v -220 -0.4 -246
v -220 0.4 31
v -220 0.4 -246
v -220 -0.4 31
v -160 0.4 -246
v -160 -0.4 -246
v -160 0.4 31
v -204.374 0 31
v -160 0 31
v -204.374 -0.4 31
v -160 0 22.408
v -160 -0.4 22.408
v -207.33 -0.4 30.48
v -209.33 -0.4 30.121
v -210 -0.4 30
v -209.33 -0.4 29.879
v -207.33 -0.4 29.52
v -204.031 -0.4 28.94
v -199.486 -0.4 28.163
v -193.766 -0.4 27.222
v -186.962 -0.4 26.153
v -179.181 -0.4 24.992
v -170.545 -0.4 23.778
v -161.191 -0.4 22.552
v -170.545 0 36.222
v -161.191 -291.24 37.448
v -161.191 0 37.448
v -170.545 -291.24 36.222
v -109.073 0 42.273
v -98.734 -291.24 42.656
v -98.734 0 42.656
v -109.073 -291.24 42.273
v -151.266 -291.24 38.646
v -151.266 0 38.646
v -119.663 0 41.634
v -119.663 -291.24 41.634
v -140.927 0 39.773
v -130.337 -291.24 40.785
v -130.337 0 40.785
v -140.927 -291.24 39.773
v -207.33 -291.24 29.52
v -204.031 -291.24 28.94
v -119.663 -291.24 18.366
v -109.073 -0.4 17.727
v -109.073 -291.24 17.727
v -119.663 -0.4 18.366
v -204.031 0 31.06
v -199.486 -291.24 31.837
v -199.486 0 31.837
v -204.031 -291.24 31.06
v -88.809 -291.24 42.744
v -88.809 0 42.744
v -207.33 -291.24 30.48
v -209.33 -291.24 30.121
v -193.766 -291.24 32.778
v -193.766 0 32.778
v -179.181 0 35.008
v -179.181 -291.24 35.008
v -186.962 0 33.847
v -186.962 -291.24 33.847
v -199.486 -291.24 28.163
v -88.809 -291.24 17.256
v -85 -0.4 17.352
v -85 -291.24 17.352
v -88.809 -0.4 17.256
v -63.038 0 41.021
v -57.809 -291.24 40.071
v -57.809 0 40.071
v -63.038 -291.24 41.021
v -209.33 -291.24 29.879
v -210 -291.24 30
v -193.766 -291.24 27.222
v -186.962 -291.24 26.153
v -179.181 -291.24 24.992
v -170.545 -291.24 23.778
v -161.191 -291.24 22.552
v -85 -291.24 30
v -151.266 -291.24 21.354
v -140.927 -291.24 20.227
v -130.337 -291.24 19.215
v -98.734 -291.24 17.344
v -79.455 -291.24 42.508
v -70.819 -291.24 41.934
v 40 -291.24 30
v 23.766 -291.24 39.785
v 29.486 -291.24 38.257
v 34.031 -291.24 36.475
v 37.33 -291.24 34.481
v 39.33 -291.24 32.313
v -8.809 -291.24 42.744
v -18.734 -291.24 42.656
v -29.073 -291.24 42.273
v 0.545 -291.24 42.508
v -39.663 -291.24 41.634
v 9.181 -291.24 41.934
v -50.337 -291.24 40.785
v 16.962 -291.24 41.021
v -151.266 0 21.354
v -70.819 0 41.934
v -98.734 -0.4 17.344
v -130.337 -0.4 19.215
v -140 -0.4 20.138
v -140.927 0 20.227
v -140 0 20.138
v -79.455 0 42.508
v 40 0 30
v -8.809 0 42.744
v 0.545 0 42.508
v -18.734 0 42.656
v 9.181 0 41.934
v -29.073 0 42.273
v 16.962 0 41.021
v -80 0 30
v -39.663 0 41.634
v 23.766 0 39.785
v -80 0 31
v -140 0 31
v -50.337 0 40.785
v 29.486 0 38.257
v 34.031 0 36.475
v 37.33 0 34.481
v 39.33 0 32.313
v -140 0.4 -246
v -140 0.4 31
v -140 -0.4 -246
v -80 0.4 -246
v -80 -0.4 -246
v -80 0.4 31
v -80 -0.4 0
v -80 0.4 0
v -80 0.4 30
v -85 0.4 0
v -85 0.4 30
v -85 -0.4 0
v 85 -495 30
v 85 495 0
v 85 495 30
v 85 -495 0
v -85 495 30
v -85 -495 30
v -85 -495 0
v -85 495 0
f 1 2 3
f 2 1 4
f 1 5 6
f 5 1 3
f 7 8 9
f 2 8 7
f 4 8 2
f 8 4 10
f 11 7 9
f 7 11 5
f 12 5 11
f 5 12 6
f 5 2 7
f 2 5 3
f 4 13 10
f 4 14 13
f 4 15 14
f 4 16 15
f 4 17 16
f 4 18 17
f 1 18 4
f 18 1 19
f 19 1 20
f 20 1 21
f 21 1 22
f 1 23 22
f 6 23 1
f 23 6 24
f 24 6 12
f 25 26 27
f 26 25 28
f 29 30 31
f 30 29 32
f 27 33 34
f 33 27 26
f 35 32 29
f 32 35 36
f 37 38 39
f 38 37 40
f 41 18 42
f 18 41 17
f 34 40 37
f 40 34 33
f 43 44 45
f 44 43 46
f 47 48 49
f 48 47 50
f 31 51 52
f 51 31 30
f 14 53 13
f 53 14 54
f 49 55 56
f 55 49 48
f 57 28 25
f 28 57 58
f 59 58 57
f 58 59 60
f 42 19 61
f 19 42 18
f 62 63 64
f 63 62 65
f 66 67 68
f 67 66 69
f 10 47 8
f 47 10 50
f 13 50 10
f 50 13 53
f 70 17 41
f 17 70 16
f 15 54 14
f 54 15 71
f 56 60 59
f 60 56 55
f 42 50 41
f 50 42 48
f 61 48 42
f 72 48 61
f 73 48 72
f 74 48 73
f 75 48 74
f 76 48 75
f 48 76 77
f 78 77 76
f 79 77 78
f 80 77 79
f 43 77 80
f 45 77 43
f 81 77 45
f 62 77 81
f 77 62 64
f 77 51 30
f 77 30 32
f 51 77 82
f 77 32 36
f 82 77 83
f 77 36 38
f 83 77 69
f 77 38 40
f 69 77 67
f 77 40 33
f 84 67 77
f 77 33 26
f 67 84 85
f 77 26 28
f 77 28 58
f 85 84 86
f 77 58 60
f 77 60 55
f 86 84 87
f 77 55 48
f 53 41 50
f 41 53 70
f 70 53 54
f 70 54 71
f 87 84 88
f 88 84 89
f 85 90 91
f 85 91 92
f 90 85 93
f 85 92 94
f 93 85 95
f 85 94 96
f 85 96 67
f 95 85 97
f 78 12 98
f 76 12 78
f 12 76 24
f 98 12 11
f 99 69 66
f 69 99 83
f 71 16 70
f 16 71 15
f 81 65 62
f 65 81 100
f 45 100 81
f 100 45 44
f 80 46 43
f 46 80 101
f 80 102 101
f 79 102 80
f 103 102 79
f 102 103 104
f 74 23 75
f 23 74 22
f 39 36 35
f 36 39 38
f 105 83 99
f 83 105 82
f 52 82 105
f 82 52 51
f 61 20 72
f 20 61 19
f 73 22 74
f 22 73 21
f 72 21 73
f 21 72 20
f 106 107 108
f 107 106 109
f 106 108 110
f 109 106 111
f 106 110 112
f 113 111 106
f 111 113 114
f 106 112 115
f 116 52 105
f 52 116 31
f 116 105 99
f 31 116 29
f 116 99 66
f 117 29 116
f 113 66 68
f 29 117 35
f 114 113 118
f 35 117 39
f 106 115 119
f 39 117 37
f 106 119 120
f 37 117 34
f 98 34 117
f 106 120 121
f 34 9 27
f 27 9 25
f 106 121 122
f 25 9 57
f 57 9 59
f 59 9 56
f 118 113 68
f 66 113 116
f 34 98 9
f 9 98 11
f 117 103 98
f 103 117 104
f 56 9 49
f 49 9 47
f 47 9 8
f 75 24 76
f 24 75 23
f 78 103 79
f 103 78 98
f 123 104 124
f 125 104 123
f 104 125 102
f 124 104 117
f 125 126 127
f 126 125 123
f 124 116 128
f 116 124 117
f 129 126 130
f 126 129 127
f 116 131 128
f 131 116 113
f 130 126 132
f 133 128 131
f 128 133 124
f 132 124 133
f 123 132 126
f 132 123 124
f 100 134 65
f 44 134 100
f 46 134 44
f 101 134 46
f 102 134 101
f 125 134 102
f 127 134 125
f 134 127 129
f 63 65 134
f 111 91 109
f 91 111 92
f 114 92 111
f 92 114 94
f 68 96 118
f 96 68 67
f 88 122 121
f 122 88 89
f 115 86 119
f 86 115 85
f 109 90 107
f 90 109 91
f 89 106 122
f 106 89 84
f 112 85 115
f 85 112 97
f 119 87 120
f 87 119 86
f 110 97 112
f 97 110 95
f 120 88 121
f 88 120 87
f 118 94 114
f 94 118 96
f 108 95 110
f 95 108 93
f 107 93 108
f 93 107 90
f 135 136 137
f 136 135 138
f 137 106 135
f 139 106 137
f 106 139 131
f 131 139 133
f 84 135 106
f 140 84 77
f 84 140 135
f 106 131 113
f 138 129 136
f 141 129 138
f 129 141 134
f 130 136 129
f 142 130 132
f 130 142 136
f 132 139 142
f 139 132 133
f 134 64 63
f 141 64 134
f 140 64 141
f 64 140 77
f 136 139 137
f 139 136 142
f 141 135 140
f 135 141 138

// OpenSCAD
// file: ../666_1032.scad
draft = true;   // sets rendering quality to draft.
$fs = draft ? 5 : 0.5;
$fa = 10;

module 666_1032(draft){

    airfoil_thickness = 0030;
    depth = main_tube_outer_diameter*2;
    width = main_tube_outer_diameter + 2*(main_tube_outer_diameter/10);
    height = depth;

    beta = 90 - trailing_edge_angle(naca = airfoil_thickness); // calculate the angle of trailing edge
    trailing_wall= 1/(cos(beta)); //calculate lenght of wall cut relative to wall thickness
    echo(trailing_wall); // print a relative thickness of material at traling edge to wall thickness. 

    difference (){
union(){

    difference(){
    	airfoil(naca = airfoil_thickness, L = 170, N=101, h = height_of_vertical_tube + main_tube_outer_diameter/2 + 2*global_clearance + coupling_wall_thickness, open = false);
    	translate ([hull_wall_thickness,0,45])
            resize([170 - hull_wall_thickness - trailing_wall*hull_wall_thickness,(170*airfoil_thickness/100)- 2*hull_wall_thickness,210], auto=true) 
                airfoil(naca = airfoil_thickness, L = 170, N=101, h = height_of_vertical_tube + main_tube_outer_diameter/2 + 2*global_clearance, open = false);
    }
    //lem spodní a horní díl
    intersection(){
        difference(){
            union(){
                translate([0,-75,cover_pilon_division[1] - hull_wall_thickness])
                        cube([190,150,hull_wall_thickness]);
                translate([0,-75,cover_pilon_division[1]])
                        cube([190,150,hull_wall_thickness]);
        }

        translate ([ribbon_width,0,45])
            resize([170 - ribbon_width - trailing_wall*ribbon_width,(170*airfoil_thickness/100)- 2*ribbon_width,210], auto=true) 
                airfoil(naca = airfoil_thickness, L = 170, N=101, h = height_of_vertical_tube + main_tube_outer_diameter/2 + 2*global_clearance, open = false);
    //difference
    }
        airfoil(naca = airfoil_thickness, L = 170, N=101, h = height_of_vertical_tube + main_tube_outer_diameter/2 + 2*global_clearance + coupling_wall_thickness, open = false);
}
}
    	//pro otevření
    	translate ([120,- hull_wall_thickness/2,- 2*global_clearance])
    	   cube ([60,hull_wall_thickness,height_of_vertical_tube + 4*global_clearance]);

    	translate ([main_tube_outer_diameter + coupling_wall_thickness*2,-depth/2 - global_clearance,height_of_vertical_tube - main_tube_outer_diameter*2 - global_clearance/2 + main_tube_outer_diameter/2 + coupling_wall_thickness])
    	   cube ([width*5,depth + 2*global_clearance,height+global_clearance + main_tube_outer_diameter]);

        // hull shell from 666_1025.scad
        translate ([- cover_pilon_position,0,0])
            rotate ([90,0,0])
                drop(draft);
    //final difference
    }
//final module
}


//pro tisk

module 666_1032_A(draft){
        intersection(){
                666_1032(draft);
            translate([0,- 75,0])
                cube([180,150,cover_pilon_division[1]]);
        }
}

module 666_1032_B(draft){
    translate([0,0,20])
        intersection(){
                666_1032(draft);
            translate([0,- 75,cover_pilon_division[1]])
                cube([180,150,cover_pilon_division[2] - cover_pilon_division[1]]);
        }
}

//666_1032(draft);
666_1032_A(draft);
666_1032_B(draft);

use <./lib/naca4.scad>
include <../Parameters.scad>
use <666_1025.scad>
use <888_1000.scad>
// file: ../888_1000.scad
/*
// Nastavení zobrazení
$vpr = [338, 0, 357];
$vpt = [180, 25, -18];
$vpd = 1280;
*/
//improving rendering speed.
draft = true;   // sets rendering quality to draft.
$fs = draft ? 5 : 0.5;
$fa = 10;

/*
TODO: 

Přední díl obsahuje převis ve směru vybrání pro držák motoru. (U horního zámku)
Otvory pro šrouby v předním dílu jsou oválné, protože nejsou kolmo k rovině modelu.


*/




//vnitřní kapka
module hollowing_skeleton(shell_thickness = hull_wall_thickness, draft)
{

    beta = 90 - trailing_edge_angle(naca = hull_airfoil_thickness); // calculate the angle of trailing edge
    trailing_wall= 1/(cos(beta)); //calculate lenght of wall cut relative to wall thickness 

    intersection () {
    resize([hull_drop_length - shell_thickness - trailing_wall* shell_thickness, (hull_drop_length*hull_airfoil_thickness/100) - 2*shell_thickness, (hull_drop_length*hull_airfoil_thickness/100) - 2*shell_thickness], auto=true)
            rotate ([0,90,0])           
            rotate_extrude($fn = draft ? 50 : 100)
                rotate([0,0,90])
                    difference()
                    {
                      polygon(points = airfoil_data(naca=hull_airfoil_thickness, L = hull_drop_length, N=draft ? 50 : 200)); 
                      square(hull_drop_length); 
                    }
                    
      translate([0,0,hull_corner_radius])
        minkowski(){                   
            translate ([0,- hull_y_size , - hull_z_size/2 + shell_thickness])
                cube ([hull_x_size,2*hull_y_size - shell_thickness, hull_z_size - 2*shell_thickness - 2*hull_corner_radius]);
                rotate ([0,90,0])
                    cylinder (h = 1, r = hull_corner_radius, $fn = draft ? 50 : 100);                   
          }
                            
    }
}

module hollowing_skeleton_hem(ribbon_width, draft)
{

    beta = 90 - trailing_edge_angle(naca = hull_airfoil_thickness); // calculate the angle of trailing edge
    trailing_wall= 1/(cos(beta)); //calculate lenght of wall cut relative to wall thickness 

    intersection () {
    resize([hull_drop_length - ribbon_width - trailing_wall* ribbon_width, (hull_drop_length*hull_airfoil_thickness/100) - 2*ribbon_width, (hull_drop_length*hull_airfoil_thickness/100) - 2*ribbon_width], auto=true)
            rotate ([0,90,0])           
            rotate_extrude($fn = draft ? 50 : 100)
                rotate([0,0,90])
                    difference()
                    {
                      polygon(points = airfoil_data(naca=hull_airfoil_thickness, L = hull_drop_length, N=draft ? 50 : 200)); 
                      square(hull_drop_length); 
                    }
                    
      translate([0,0,hull_corner_radius])
        minkowski(){                   
            translate ([0,- hull_y_size, - hull_z_size/2 + ribbon_width])
                cube ([hull_x_size,2*hull_y_size - ribbon_width, hull_z_size - 2*ribbon_width - 2*hull_corner_radius]);
                rotate ([0,90,0])
                    cylinder (h = 1, r = hull_corner_radius, $fn = draft ? 50 : 100);                   
          }
                            
    }
}




//celá kapka
module drop(draft = true)
{

    beta = 90 - trailing_edge_angle(naca = hull_airfoil_thickness); // calculate the angle of trailing edge
    trailing_wall= 1/(cos(beta)); //calculate lenght of wall cut relative to wall thickness 

	intersection () {
    	rotate ([0,90,0])           
        	rotate_extrude($fn = draft ? 50 : 100)
                    rotate([0,0,90])
                        difference()
                        {
	                        polygon(points = airfoil_data(naca=hull_airfoil_thickness, L =hull_drop_length , N=draft ? 50 : 200)); 
    	                    square(hull_drop_length); 
        	            }
            		
        translate([0,0,hull_corner_radius])
          	minkowski(){                   
             	translate ([0,-hull_y_size,-hull_z_size/2])
             			cube ([hull_x_size, 2*hull_y_size,hull_z_size-2*hull_corner_radius]);
             	  	rotate ([0,90,0])
                 		cylinder (h = 1, r = hull_corner_radius, $fn = draft ? 50 : 100);                   
		    }
		    
	}
}


//základní kapka
module drop_skin(draft){

	difference(){
			drop();
		translate([hull_wall_thickness,0,0])
			hollowing_skeleton();
	}

}




drop_skin();














use <./lib/naca4.scad>
include <../Parameters.scad>
// file: ../666_1025.scad
use <./lib/naca4.scad>
include <../Parameters.scad>
use <666_1032.scad>


//Jen pro názornost
	//translate([180,0,0])
		//rotate ([-90,0,0])
			//666_1032();





module 666_1025(){

    beta = 90 - trailing_edge_angle(naca = hull_airfoil_thickness); // calculate the angle of trailing edge
    trailing_wall= 1/(cos(beta)); //calculate lenght of wall cut relative to wall thickness
    echo(trailing_wall); // print a relative thickness of material at traling edge to wall thickness.    

    difference(){
        intersection () {
            union(){
        		rotate ([0,90,0])           
                    rotate_extrude($fn = 100)
                        rotate([0,0,90])
                            difference()
                            {

                              polygon(points = airfoil_data(naca=hull_airfoil_thickness, L =hull_drop_length , N=100)); 
                              square(hull_drop_length); 
                            }

                // 666_1032 part holder
                translate([180,0,0]) 
                    rotate ([-90,0,0]) 
                        difference(){
                            
                            translate ([hull_wall_thickness,0,0])
                                resize([170 - hull_wall_thickness - trailing_wall*hull_wall_thickness,(170*0030/100)- 2*hull_wall_thickness,210], auto=true) 
                                    airfoil(naca = 0030, L = 170, N=101, h = 200, open = false);
                            translate ([2*hull_wall_thickness,0,0])       
                                resize([170 - hull_wall_thickness*2 - trailing_wall*hull_wall_thickness*2,(160*0030/100)- 2*hull_wall_thickness,210], auto=true) 
                                    airfoil(naca = 0030, L = 170, N=101, h = 200, open = false);
                            
                        }

            }
            minkowski(){                   
             	translate ([0,-(main_tube_outer_diameter/2)+1,-hull_z_size/2])
             		cube ([hull_x_size, hull_y_size,hull_z_size]);
             	
             		rotate ([0,90,0])
                 		cylinder (h = 1, r = hull_corner_radius, $fn = 100);                   

        	}

        }   

        //hollowing skeleton
    		translate ([hull_wall_thickness,0,0])
            	intersection () {
                    resize([hull_drop_length - hull_wall_thickness - trailing_wall* hull_wall_thickness, (hull_drop_length*hull_airfoil_thickness/100) - 2*hull_wall_thickness, (hull_drop_length*hull_airfoil_thickness/100) - 2*hull_wall_thickness], auto=true)
                 		rotate ([0,90,0])           
                            rotate_extrude($fn = 100)
                                rotate([0,0,90])
                                    difference()
                                    {

                                      polygon(points = airfoil_data(naca=hull_airfoil_thickness, L = hull_drop_length, N=200)); 
                                      square(hull_drop_length); 
                                    }
                 	minkowski(){                   
                     	translate ([0,-(main_tube_outer_diameter/2),-hull_z_size/2 + hull_wall_thickness])
                     		cube ([hull_x_size,hull_y_size - hull_wall_thickness, hull_z_size - 2*hull_wall_thickness]);
                     		rotate ([0,90,0])
                         		cylinder (h = 1, r = hull_corner_radius, $fn = 100);                   
            		}                   
            	}
            //for front part
    		translate ([-2,-1 - main_tube_outer_diameter/2,-25])
    				cube ([52,hull_y_size+10,50]);

        //for tube in back
    		translate ([hull_x_size-70,0,0])
    			rotate ([0,90,0])
    				cylinder (h = 80, r1 = main_tube_outer_diameter/2, r2 = main_tube_outer_diameter/2, $fn = 200);
    					    
        //for tube - propeller

			translate ([180+2*hull_wall_thickness,-10,0])       
				rotate ([-90,0,0])
                    resize([170 - hull_wall_thickness*2 - trailing_wall*hull_wall_thickness*2,(160*0030/100)- 2*hull_wall_thickness,210], auto=true) 
                        airfoil(naca = 0030, L = 170, N=101, h = 200, open = false);
        			
        //for printing
    		translate([0,-main_tube_outer_diameter/2-4.90,-170/2])
    			cube ([600,5,170]);

    		translate([hull_x_size-50,-main_tube_outer_diameter,-main_tube_outer_diameter/2])		
    			cube([80,main_tube_outer_diameter, main_tube_outer_diameter]);	

    }


}

    intersection(){
        666_1025();
        translate([0,-20,-150])                        
           cube([150,150,300]);
    }

    translate([20,0,0])
        intersection(){
            666_1025();
            translate([150,-20,-150])
               cube([150,150,300]);
        }

    translate([40,0,0])
        intersection(){
            666_1025();
            translate([300,-20,-150])
               cube([150,150,300]);
        }


    translate([60,0,0])
        intersection(){
            666_1025();
            translate([450,-20,-150])
               cube([150,150,300]);
        }
// file: ../lib/naca4.scad
// Naca4.scad - library for parametric airfoils of 4 digit NACA series
// Code: Rudolf Huttary, Berlin 
// June 2015
// commercial use prohibited


// general use: for more examples refer to sampler.scad
// naca = naca digits or 3el vector  (default = 12 or [0, 0, .12])
// L    = chord length [mm]      (default= 100)
// N    = # sample points        (default= 81)
// h    = height [mm]            (default= 1)
// open = close at the thin end? (default = true)
// two equivalent example calls
 airfoil(naca = 2408, L = 60, N=1001, h = 30, open = false); 
// airfoil(naca = [.2, .4, .32], L = 60, N=1001, h = 30, open = false); 

module help()
{
  echo(str("\n\nList of signatures in lib:\n=================\n", 
  "module airfoil(naca=2412, L = 100, N = 81, h = 1, open = false) - renders airfoil object\n", 
  "module airfoil(naca=[.2, .4, .12], L = 100, N = 81, h = 1, open = false) - renders airfoil object using percentage for camber,  camber distance and thicknes\n", 
  "function airfoil_data(naca=12, L = 100, N = 81, open = false)\n",
  "=================\n")); 
}

help(); 
// this is the object
module airfoil(naca=12, L = 100, N = 81, h = 1, open = false)
{
  linear_extrude(height = h)
  polygon(points = airfoil_data(naca, L, N, open)); 
}

module hollow_airfoil(lnaca=12, L = 100, N = 81, h = 1, open = false, wall_thickness = 1)
{
    if (open){
        linear_extrude(height = h)

        if (wall_thickness>0){
            difference(){
                polygon(points = airfoil_data(naca, L, N, false));
                offset(delta = - wall_thickness, chamfer = false) polygon(points = airfoil_data(naca, L, N, open = false));
            }
        }
        else{
            difference(){
                offset(delta = - wall_thickness, chamfer = false) polygon(points = airfoil_data(naca, L, N, open = false));
                polygon(points = airfoil_data(naca, L, N, false));
            }
        }
    }
    else{

        linear_extrude(height = abs(wall_thickness))
            polygon(points = airfoil_data(naca, L, N, false)); 

        linear_extrude(height = h)
            difference(){
                polygon(points = airfoil_data(naca, L, N, open));
                offset(delta = - wall_thickness) polygon(points = airfoil_data(naca, L, N, open = false));
            }

        translate([0,0, h - wall_thickness])
            linear_extrude(height = abs(wall_thickness))
                polygon(points = airfoil_data(naca, L, N, false)); 

    }
}


// this is the main function providing the airfoil data
function airfoil_data(naca=12, L = 100, N = 81, open = false) = 
  let(Na = len(naca)!=3?NACA(naca):naca)
  let(A = [.2969, -0.126, -.3516, .2843, open?-0.1015:-0.1036])
  [for (b=[-180:360/(N):179.99]) 
    let (x = (1-cos(b))/2)  
    let(yt = sign(b)*Na[2]/.2*(A*[sqrt(x), x, x*x, x*x*x, x*x*x*x])) 
    Na[0]==0?L*[x, yt]:L*camber(x, yt, Na[0], Na[1], sign(b))];  


function trailing_edge_angle(naca=12, open = false) = 
  let(Na = len(naca)!=3?NACA(naca):naca)
  let(A = [.2969, -0.126, -.3516, .2843, open?-0.1015:-0.1036])
  let (x =0.999)  // set x near to airfoil trailing edge
  let(yt = Na[2]/.2*(A*[sqrt(x), x, x*x, x*x*x, x*x*x*x])) // calculate distance from x-axis at previously set position
  atan2(yt,1-x);  // calculate angle of triangle between end of airfoil. The triange height corresponds to previously calculated distance from x-axis

function surface_angle(x = 0.5, naca=12, open = false) = 
  let(Na = len(naca)!=3?NACA(naca):naca)
  let(A = [0.2969, -0.126, -0.3516, 0.2843, open?-0.1015:-0.1036])
  let(dy = Na[2]/0.2*(A*[(1/2)*(1/sqrt(x)), 1, 2*x, 3*x*x, 4*x*x*x])) // calculate derivative of airfoil function at the x point
  atan(dy);  // calculate  the angle from function derivative

function surface_distance(x = 0.5, naca=12, open = false) = 
  let(Na = len(naca)!=3?NACA(naca):naca)
  let(A = [0.2969, -0.126, -0.3516, 0.2843, open?-0.1015:-0.1036])
  Na[2]/.2*(A*[sqrt(x), x, x*x, x*x*x, x*x*x*x]); // calculate distance from x-axis at previously set position

// helper functions
function NACA(naca) = 
  let (M = floor(naca/1000))
  let (P = floor((naca-M*1000)/100)) 
  [M/100, P/10, floor(naca-M*1000-P*100)/100];  

function camber(x, y, M, P, upper) = 
  let(yc = (x<P)?M/P/P*(2*P*x-x*x): M/(1-P)/(1-P)*(1 - 2*P + 2*P*x -x*x))
  let(dy = (x<P)?2*M/P/P*(P-x):2*M/(1-P)/(1-P)*(P-x))
  let(th = atan(dy))
  [upper ? x - y*sin(th):x + y*sin(th), upper ? yc + y*cos(th):yc - y*cos(th)];
// file: rotor_blade_double.scad
include <../../Parameters.scad>
use <../333_1037.scad>

$vpd = 680;

module rotor_blade_double(draft)
{
    draft = false;        
    plywood_thickness = 4;
    core_thickness = 1.0;
    length = 970;       // celková délka polotovaru
    material_width = 70;
    side_margin = 10; 

    x_size = 2*material_width + 3*side_margin;
    y_size = length + 2*side_margin;
    translate([-x_size/2, -y_size/2,0])
        cube([x_size,y_size, plywood_thickness]);

    translate([- material_width/2 - side_margin/2, 0, plywood_thickness + core_thickness/2])
        333_1037(twosided = true, draft = draft);

    translate([material_width/2 + side_margin/2, 0, plywood_thickness + core_thickness/2])
        333_1037(twosided = true, draft = draft);
}

rotor_blade_double();
// file: ../333_1037.scad
draft = true;   // sets rendering quality to draft.
$fs = draft ? 5 : 0.5;
$fa = 10;

module 333_1037(draft){

    airfoil_thickness = 0015;
    airfoil_depth = main_tube_outer_diameter*2;
    lenght = 970;


    difference (){
        %cube ([970,70,3.86*2], center = true);

    	translate ([120,- hull_wall_thickness/2,- 2*global_clearance])
            cube ([60,hull_wall_thickness,height_of_vertical_tube + 4*global_clearance]);
    }

    //translate ([120,- hull_wall_thickness/2,- 2*global_clearance])
    rotate([90,0,0])
        airfoil(naca = airfoil_thickness, L = 170, N = draft ? 50 : 100, h = height_of_vertical_tube + main_tube_outer_diameter/2 + 2*global_clearance + thickness_between_tubes, open = false);

}



333_1037(draft);

use <./lib/naca4.scad>
include <../Parameters.scad>
use <666_1025.scad>
use <888_1000.scad>
// file: ../../Parameters.scad
//Main tube diameter - hole [mm]
main_tube_outer_diameter = 25.4;
main_tube_inner_diameter = 23.5;

//Tube for undercarriage - hole [mm]
tube_for_undercarriage_outer_diameter = 10.6;
tube_for_undercarriage_inner_diameter = 6;
global_clearance = 0.5;


//umístění podvozkových trubek

second_undercarriage_hole = main_tube_outer_diameter*2 + main_tube_outer_diameter/5 + main_tube_outer_diameter/2 + 170 + 160;

// Parameters of cube couplings
coupling_wall_thickness = main_tube_outer_diameter/5;  //width of coupling walls 
thickness_between_tubes = main_tube_outer_diameter/10;    // minimum distance between tubes in couplings

coupling_wall_thickness_undercarriage = tube_for_undercarriage_outer_diameter/3;
thickness_between_tubes_undercarriage = tube_for_undercarriage_outer_diameter/10;

//Screw diameter and nut for M4 [mm]
M4_screw_diameter=4.5;
Nut_height_M4 = 3.2;
Nut_diameter_M4 = 7.86;


//Screw diameter and nut for M3 [mm]
M3_screw_diameter = 3.2;
Nut_height_M3 = 1.7;	
Nut_diameter_M3 = 6.6; 


//The tube for help
Help_main_tube_outer = 25;
Help_main_tube_inner = 23; 
Help_tube_for_undercarriage_outer = 10;
Help_tube_for_undercarriage_inner = 5;


//main hull parameters

hull_drop_length = 580;
hull_wall_thickness = 0.8;
hull_y_size = 120;
hull_z_size = 150;
hull_x_size = 580;
hull_corner_radius = 4;
hull_airfoil_thickness= 35;  // thickness of drop generating airfoil in percent of lenght.
hull_scale_x = 1;
hull_scale_y = 1.5;
hull_scale_z = 1.5;

main_pilon_position = 170+68;
cover_pilon_position = 180;
height_of_vertical_tube = 275; //278mm je změřená délka trubky. 

ribbon_width = 5; // šířka vyztužovacích lemů. 

// šířka otvoru v přední části kapoty pro držák motoru.
width_of_engine_holder = 63;

//Top Cover Division - dělení horního krytu pro tisk
top_cover_division = [0, 50, 150, 280, 410, hull_x_size]; // upraveny seznam tak, aby deleni začinalo od nuly, což umožňí úplně automatické rozdělení.

//Bottom Cover Division - dělení dolního krytu pro tisk
bottom_cover_division = [0,100,250,365, 470, hull_x_size];
// zkrácená část pro payload pro testovací tisk
//bottom_cover_division = [0,200,250,365, 470, hull_x_size];

//Base Divison - dělení podložky
base_division = [0,140,280,410, hull_x_size];

//Cover pilon division - na výšku (v ose Z)
cover_pilon_division = [0,170,height_of_vertical_tube + main_tube_outer_diameter + coupling_wall_thickness];

//pozice šroubů
	//horní kryt
top_screw_position = [0, (top_cover_division[0] + top_cover_division[1])/4, (top_cover_division[2] - top_cover_division[1])/2 + top_cover_division[1], (top_cover_division[3] - top_cover_division[2])/2 + top_cover_division[2],(top_cover_division[4] - top_cover_division[3])/2 + top_cover_division[3],(top_cover_division[5] - top_cover_division[4])/2 + top_cover_division[4] - 20];
	//spodní kryt
bottom_screw_position = [0,(bottom_cover_division[0] + bottom_cover_division[1])/15 + 5, bottom_cover_division[1]/1.1, + bottom_cover_division[3], bottom_cover_division[3] + bottom_cover_division[1]/2, bottom_cover_division[4] - 6*global_clearance, bottom_cover_division[4] + bottom_cover_division[1]/2.5];




//šířka zámků
lock_width = 10;

//délka zámků
lock_length = 3;


//accumulator
//základní rozměry akumulátoru
width_of_accumulator = 129.4;//45+1;
depth_of_accumulator = 40.61;
height_of_accumulator = 43.65;
//Zapuštění akumulátoru
sink_of_accumulator = 5; //main_tube_outer_diameter/5 - Nut_height_M3*1.5;

//tloušťka hrany spojky
accumulator_holder_width = 18; 
accumulator_holder_thickness = 10; 

//posunutí akumálátoru na podložce
move_of_accumulator = 165;   // pozice akumulátoru (ovlivňuje těžiště)


////////////////
// Senzory
///////////////////

//opticalFlow
    width_optical_flow_senzor = 45.5;
    depth_optical_flow_senzor = 6;
    height_optical_flow_senzor = 35;
    sink_of_optical_flow_senzor = depth_optical_flow_senzor - 5; 
    M3_optical_flow_senzor_Z = 30.4;
    M3_optical_flow_senzor_X = 24;
    M3_optical_flow_senzor_Z_alone = 9.1;
    M3_optical_flow_senzor_X_alone = 16.7;
// main file
include <../../Parameters.scad>
use <../333_1037.scad>

use <rotor_blade_double.scad>

$vpd = 680;

draft = true;        
plywood_thickness = 4;
thickness = 30;
core_thickness = 1.0;
length = 970;       // celková délka polotovaru
material_width = 70;
side_margin = 10; 

x_size = 2*material_width + 3*side_margin;
y_size = length + 2*side_margin;
translate([-x_size/2, -y_size/2, 0])
    cube([x_size,y_size, thickness]);

translate([- material_width/2 - side_margin/2, 0, thickness])
    rotate([0,180,0])
        333_1037(twosided = true, draft = draft);

translate([material_width/2 + side_margin/2, 0, thickness])
    rotate([0,180,0])
        333_1037(twosided = true, draft = draft);
